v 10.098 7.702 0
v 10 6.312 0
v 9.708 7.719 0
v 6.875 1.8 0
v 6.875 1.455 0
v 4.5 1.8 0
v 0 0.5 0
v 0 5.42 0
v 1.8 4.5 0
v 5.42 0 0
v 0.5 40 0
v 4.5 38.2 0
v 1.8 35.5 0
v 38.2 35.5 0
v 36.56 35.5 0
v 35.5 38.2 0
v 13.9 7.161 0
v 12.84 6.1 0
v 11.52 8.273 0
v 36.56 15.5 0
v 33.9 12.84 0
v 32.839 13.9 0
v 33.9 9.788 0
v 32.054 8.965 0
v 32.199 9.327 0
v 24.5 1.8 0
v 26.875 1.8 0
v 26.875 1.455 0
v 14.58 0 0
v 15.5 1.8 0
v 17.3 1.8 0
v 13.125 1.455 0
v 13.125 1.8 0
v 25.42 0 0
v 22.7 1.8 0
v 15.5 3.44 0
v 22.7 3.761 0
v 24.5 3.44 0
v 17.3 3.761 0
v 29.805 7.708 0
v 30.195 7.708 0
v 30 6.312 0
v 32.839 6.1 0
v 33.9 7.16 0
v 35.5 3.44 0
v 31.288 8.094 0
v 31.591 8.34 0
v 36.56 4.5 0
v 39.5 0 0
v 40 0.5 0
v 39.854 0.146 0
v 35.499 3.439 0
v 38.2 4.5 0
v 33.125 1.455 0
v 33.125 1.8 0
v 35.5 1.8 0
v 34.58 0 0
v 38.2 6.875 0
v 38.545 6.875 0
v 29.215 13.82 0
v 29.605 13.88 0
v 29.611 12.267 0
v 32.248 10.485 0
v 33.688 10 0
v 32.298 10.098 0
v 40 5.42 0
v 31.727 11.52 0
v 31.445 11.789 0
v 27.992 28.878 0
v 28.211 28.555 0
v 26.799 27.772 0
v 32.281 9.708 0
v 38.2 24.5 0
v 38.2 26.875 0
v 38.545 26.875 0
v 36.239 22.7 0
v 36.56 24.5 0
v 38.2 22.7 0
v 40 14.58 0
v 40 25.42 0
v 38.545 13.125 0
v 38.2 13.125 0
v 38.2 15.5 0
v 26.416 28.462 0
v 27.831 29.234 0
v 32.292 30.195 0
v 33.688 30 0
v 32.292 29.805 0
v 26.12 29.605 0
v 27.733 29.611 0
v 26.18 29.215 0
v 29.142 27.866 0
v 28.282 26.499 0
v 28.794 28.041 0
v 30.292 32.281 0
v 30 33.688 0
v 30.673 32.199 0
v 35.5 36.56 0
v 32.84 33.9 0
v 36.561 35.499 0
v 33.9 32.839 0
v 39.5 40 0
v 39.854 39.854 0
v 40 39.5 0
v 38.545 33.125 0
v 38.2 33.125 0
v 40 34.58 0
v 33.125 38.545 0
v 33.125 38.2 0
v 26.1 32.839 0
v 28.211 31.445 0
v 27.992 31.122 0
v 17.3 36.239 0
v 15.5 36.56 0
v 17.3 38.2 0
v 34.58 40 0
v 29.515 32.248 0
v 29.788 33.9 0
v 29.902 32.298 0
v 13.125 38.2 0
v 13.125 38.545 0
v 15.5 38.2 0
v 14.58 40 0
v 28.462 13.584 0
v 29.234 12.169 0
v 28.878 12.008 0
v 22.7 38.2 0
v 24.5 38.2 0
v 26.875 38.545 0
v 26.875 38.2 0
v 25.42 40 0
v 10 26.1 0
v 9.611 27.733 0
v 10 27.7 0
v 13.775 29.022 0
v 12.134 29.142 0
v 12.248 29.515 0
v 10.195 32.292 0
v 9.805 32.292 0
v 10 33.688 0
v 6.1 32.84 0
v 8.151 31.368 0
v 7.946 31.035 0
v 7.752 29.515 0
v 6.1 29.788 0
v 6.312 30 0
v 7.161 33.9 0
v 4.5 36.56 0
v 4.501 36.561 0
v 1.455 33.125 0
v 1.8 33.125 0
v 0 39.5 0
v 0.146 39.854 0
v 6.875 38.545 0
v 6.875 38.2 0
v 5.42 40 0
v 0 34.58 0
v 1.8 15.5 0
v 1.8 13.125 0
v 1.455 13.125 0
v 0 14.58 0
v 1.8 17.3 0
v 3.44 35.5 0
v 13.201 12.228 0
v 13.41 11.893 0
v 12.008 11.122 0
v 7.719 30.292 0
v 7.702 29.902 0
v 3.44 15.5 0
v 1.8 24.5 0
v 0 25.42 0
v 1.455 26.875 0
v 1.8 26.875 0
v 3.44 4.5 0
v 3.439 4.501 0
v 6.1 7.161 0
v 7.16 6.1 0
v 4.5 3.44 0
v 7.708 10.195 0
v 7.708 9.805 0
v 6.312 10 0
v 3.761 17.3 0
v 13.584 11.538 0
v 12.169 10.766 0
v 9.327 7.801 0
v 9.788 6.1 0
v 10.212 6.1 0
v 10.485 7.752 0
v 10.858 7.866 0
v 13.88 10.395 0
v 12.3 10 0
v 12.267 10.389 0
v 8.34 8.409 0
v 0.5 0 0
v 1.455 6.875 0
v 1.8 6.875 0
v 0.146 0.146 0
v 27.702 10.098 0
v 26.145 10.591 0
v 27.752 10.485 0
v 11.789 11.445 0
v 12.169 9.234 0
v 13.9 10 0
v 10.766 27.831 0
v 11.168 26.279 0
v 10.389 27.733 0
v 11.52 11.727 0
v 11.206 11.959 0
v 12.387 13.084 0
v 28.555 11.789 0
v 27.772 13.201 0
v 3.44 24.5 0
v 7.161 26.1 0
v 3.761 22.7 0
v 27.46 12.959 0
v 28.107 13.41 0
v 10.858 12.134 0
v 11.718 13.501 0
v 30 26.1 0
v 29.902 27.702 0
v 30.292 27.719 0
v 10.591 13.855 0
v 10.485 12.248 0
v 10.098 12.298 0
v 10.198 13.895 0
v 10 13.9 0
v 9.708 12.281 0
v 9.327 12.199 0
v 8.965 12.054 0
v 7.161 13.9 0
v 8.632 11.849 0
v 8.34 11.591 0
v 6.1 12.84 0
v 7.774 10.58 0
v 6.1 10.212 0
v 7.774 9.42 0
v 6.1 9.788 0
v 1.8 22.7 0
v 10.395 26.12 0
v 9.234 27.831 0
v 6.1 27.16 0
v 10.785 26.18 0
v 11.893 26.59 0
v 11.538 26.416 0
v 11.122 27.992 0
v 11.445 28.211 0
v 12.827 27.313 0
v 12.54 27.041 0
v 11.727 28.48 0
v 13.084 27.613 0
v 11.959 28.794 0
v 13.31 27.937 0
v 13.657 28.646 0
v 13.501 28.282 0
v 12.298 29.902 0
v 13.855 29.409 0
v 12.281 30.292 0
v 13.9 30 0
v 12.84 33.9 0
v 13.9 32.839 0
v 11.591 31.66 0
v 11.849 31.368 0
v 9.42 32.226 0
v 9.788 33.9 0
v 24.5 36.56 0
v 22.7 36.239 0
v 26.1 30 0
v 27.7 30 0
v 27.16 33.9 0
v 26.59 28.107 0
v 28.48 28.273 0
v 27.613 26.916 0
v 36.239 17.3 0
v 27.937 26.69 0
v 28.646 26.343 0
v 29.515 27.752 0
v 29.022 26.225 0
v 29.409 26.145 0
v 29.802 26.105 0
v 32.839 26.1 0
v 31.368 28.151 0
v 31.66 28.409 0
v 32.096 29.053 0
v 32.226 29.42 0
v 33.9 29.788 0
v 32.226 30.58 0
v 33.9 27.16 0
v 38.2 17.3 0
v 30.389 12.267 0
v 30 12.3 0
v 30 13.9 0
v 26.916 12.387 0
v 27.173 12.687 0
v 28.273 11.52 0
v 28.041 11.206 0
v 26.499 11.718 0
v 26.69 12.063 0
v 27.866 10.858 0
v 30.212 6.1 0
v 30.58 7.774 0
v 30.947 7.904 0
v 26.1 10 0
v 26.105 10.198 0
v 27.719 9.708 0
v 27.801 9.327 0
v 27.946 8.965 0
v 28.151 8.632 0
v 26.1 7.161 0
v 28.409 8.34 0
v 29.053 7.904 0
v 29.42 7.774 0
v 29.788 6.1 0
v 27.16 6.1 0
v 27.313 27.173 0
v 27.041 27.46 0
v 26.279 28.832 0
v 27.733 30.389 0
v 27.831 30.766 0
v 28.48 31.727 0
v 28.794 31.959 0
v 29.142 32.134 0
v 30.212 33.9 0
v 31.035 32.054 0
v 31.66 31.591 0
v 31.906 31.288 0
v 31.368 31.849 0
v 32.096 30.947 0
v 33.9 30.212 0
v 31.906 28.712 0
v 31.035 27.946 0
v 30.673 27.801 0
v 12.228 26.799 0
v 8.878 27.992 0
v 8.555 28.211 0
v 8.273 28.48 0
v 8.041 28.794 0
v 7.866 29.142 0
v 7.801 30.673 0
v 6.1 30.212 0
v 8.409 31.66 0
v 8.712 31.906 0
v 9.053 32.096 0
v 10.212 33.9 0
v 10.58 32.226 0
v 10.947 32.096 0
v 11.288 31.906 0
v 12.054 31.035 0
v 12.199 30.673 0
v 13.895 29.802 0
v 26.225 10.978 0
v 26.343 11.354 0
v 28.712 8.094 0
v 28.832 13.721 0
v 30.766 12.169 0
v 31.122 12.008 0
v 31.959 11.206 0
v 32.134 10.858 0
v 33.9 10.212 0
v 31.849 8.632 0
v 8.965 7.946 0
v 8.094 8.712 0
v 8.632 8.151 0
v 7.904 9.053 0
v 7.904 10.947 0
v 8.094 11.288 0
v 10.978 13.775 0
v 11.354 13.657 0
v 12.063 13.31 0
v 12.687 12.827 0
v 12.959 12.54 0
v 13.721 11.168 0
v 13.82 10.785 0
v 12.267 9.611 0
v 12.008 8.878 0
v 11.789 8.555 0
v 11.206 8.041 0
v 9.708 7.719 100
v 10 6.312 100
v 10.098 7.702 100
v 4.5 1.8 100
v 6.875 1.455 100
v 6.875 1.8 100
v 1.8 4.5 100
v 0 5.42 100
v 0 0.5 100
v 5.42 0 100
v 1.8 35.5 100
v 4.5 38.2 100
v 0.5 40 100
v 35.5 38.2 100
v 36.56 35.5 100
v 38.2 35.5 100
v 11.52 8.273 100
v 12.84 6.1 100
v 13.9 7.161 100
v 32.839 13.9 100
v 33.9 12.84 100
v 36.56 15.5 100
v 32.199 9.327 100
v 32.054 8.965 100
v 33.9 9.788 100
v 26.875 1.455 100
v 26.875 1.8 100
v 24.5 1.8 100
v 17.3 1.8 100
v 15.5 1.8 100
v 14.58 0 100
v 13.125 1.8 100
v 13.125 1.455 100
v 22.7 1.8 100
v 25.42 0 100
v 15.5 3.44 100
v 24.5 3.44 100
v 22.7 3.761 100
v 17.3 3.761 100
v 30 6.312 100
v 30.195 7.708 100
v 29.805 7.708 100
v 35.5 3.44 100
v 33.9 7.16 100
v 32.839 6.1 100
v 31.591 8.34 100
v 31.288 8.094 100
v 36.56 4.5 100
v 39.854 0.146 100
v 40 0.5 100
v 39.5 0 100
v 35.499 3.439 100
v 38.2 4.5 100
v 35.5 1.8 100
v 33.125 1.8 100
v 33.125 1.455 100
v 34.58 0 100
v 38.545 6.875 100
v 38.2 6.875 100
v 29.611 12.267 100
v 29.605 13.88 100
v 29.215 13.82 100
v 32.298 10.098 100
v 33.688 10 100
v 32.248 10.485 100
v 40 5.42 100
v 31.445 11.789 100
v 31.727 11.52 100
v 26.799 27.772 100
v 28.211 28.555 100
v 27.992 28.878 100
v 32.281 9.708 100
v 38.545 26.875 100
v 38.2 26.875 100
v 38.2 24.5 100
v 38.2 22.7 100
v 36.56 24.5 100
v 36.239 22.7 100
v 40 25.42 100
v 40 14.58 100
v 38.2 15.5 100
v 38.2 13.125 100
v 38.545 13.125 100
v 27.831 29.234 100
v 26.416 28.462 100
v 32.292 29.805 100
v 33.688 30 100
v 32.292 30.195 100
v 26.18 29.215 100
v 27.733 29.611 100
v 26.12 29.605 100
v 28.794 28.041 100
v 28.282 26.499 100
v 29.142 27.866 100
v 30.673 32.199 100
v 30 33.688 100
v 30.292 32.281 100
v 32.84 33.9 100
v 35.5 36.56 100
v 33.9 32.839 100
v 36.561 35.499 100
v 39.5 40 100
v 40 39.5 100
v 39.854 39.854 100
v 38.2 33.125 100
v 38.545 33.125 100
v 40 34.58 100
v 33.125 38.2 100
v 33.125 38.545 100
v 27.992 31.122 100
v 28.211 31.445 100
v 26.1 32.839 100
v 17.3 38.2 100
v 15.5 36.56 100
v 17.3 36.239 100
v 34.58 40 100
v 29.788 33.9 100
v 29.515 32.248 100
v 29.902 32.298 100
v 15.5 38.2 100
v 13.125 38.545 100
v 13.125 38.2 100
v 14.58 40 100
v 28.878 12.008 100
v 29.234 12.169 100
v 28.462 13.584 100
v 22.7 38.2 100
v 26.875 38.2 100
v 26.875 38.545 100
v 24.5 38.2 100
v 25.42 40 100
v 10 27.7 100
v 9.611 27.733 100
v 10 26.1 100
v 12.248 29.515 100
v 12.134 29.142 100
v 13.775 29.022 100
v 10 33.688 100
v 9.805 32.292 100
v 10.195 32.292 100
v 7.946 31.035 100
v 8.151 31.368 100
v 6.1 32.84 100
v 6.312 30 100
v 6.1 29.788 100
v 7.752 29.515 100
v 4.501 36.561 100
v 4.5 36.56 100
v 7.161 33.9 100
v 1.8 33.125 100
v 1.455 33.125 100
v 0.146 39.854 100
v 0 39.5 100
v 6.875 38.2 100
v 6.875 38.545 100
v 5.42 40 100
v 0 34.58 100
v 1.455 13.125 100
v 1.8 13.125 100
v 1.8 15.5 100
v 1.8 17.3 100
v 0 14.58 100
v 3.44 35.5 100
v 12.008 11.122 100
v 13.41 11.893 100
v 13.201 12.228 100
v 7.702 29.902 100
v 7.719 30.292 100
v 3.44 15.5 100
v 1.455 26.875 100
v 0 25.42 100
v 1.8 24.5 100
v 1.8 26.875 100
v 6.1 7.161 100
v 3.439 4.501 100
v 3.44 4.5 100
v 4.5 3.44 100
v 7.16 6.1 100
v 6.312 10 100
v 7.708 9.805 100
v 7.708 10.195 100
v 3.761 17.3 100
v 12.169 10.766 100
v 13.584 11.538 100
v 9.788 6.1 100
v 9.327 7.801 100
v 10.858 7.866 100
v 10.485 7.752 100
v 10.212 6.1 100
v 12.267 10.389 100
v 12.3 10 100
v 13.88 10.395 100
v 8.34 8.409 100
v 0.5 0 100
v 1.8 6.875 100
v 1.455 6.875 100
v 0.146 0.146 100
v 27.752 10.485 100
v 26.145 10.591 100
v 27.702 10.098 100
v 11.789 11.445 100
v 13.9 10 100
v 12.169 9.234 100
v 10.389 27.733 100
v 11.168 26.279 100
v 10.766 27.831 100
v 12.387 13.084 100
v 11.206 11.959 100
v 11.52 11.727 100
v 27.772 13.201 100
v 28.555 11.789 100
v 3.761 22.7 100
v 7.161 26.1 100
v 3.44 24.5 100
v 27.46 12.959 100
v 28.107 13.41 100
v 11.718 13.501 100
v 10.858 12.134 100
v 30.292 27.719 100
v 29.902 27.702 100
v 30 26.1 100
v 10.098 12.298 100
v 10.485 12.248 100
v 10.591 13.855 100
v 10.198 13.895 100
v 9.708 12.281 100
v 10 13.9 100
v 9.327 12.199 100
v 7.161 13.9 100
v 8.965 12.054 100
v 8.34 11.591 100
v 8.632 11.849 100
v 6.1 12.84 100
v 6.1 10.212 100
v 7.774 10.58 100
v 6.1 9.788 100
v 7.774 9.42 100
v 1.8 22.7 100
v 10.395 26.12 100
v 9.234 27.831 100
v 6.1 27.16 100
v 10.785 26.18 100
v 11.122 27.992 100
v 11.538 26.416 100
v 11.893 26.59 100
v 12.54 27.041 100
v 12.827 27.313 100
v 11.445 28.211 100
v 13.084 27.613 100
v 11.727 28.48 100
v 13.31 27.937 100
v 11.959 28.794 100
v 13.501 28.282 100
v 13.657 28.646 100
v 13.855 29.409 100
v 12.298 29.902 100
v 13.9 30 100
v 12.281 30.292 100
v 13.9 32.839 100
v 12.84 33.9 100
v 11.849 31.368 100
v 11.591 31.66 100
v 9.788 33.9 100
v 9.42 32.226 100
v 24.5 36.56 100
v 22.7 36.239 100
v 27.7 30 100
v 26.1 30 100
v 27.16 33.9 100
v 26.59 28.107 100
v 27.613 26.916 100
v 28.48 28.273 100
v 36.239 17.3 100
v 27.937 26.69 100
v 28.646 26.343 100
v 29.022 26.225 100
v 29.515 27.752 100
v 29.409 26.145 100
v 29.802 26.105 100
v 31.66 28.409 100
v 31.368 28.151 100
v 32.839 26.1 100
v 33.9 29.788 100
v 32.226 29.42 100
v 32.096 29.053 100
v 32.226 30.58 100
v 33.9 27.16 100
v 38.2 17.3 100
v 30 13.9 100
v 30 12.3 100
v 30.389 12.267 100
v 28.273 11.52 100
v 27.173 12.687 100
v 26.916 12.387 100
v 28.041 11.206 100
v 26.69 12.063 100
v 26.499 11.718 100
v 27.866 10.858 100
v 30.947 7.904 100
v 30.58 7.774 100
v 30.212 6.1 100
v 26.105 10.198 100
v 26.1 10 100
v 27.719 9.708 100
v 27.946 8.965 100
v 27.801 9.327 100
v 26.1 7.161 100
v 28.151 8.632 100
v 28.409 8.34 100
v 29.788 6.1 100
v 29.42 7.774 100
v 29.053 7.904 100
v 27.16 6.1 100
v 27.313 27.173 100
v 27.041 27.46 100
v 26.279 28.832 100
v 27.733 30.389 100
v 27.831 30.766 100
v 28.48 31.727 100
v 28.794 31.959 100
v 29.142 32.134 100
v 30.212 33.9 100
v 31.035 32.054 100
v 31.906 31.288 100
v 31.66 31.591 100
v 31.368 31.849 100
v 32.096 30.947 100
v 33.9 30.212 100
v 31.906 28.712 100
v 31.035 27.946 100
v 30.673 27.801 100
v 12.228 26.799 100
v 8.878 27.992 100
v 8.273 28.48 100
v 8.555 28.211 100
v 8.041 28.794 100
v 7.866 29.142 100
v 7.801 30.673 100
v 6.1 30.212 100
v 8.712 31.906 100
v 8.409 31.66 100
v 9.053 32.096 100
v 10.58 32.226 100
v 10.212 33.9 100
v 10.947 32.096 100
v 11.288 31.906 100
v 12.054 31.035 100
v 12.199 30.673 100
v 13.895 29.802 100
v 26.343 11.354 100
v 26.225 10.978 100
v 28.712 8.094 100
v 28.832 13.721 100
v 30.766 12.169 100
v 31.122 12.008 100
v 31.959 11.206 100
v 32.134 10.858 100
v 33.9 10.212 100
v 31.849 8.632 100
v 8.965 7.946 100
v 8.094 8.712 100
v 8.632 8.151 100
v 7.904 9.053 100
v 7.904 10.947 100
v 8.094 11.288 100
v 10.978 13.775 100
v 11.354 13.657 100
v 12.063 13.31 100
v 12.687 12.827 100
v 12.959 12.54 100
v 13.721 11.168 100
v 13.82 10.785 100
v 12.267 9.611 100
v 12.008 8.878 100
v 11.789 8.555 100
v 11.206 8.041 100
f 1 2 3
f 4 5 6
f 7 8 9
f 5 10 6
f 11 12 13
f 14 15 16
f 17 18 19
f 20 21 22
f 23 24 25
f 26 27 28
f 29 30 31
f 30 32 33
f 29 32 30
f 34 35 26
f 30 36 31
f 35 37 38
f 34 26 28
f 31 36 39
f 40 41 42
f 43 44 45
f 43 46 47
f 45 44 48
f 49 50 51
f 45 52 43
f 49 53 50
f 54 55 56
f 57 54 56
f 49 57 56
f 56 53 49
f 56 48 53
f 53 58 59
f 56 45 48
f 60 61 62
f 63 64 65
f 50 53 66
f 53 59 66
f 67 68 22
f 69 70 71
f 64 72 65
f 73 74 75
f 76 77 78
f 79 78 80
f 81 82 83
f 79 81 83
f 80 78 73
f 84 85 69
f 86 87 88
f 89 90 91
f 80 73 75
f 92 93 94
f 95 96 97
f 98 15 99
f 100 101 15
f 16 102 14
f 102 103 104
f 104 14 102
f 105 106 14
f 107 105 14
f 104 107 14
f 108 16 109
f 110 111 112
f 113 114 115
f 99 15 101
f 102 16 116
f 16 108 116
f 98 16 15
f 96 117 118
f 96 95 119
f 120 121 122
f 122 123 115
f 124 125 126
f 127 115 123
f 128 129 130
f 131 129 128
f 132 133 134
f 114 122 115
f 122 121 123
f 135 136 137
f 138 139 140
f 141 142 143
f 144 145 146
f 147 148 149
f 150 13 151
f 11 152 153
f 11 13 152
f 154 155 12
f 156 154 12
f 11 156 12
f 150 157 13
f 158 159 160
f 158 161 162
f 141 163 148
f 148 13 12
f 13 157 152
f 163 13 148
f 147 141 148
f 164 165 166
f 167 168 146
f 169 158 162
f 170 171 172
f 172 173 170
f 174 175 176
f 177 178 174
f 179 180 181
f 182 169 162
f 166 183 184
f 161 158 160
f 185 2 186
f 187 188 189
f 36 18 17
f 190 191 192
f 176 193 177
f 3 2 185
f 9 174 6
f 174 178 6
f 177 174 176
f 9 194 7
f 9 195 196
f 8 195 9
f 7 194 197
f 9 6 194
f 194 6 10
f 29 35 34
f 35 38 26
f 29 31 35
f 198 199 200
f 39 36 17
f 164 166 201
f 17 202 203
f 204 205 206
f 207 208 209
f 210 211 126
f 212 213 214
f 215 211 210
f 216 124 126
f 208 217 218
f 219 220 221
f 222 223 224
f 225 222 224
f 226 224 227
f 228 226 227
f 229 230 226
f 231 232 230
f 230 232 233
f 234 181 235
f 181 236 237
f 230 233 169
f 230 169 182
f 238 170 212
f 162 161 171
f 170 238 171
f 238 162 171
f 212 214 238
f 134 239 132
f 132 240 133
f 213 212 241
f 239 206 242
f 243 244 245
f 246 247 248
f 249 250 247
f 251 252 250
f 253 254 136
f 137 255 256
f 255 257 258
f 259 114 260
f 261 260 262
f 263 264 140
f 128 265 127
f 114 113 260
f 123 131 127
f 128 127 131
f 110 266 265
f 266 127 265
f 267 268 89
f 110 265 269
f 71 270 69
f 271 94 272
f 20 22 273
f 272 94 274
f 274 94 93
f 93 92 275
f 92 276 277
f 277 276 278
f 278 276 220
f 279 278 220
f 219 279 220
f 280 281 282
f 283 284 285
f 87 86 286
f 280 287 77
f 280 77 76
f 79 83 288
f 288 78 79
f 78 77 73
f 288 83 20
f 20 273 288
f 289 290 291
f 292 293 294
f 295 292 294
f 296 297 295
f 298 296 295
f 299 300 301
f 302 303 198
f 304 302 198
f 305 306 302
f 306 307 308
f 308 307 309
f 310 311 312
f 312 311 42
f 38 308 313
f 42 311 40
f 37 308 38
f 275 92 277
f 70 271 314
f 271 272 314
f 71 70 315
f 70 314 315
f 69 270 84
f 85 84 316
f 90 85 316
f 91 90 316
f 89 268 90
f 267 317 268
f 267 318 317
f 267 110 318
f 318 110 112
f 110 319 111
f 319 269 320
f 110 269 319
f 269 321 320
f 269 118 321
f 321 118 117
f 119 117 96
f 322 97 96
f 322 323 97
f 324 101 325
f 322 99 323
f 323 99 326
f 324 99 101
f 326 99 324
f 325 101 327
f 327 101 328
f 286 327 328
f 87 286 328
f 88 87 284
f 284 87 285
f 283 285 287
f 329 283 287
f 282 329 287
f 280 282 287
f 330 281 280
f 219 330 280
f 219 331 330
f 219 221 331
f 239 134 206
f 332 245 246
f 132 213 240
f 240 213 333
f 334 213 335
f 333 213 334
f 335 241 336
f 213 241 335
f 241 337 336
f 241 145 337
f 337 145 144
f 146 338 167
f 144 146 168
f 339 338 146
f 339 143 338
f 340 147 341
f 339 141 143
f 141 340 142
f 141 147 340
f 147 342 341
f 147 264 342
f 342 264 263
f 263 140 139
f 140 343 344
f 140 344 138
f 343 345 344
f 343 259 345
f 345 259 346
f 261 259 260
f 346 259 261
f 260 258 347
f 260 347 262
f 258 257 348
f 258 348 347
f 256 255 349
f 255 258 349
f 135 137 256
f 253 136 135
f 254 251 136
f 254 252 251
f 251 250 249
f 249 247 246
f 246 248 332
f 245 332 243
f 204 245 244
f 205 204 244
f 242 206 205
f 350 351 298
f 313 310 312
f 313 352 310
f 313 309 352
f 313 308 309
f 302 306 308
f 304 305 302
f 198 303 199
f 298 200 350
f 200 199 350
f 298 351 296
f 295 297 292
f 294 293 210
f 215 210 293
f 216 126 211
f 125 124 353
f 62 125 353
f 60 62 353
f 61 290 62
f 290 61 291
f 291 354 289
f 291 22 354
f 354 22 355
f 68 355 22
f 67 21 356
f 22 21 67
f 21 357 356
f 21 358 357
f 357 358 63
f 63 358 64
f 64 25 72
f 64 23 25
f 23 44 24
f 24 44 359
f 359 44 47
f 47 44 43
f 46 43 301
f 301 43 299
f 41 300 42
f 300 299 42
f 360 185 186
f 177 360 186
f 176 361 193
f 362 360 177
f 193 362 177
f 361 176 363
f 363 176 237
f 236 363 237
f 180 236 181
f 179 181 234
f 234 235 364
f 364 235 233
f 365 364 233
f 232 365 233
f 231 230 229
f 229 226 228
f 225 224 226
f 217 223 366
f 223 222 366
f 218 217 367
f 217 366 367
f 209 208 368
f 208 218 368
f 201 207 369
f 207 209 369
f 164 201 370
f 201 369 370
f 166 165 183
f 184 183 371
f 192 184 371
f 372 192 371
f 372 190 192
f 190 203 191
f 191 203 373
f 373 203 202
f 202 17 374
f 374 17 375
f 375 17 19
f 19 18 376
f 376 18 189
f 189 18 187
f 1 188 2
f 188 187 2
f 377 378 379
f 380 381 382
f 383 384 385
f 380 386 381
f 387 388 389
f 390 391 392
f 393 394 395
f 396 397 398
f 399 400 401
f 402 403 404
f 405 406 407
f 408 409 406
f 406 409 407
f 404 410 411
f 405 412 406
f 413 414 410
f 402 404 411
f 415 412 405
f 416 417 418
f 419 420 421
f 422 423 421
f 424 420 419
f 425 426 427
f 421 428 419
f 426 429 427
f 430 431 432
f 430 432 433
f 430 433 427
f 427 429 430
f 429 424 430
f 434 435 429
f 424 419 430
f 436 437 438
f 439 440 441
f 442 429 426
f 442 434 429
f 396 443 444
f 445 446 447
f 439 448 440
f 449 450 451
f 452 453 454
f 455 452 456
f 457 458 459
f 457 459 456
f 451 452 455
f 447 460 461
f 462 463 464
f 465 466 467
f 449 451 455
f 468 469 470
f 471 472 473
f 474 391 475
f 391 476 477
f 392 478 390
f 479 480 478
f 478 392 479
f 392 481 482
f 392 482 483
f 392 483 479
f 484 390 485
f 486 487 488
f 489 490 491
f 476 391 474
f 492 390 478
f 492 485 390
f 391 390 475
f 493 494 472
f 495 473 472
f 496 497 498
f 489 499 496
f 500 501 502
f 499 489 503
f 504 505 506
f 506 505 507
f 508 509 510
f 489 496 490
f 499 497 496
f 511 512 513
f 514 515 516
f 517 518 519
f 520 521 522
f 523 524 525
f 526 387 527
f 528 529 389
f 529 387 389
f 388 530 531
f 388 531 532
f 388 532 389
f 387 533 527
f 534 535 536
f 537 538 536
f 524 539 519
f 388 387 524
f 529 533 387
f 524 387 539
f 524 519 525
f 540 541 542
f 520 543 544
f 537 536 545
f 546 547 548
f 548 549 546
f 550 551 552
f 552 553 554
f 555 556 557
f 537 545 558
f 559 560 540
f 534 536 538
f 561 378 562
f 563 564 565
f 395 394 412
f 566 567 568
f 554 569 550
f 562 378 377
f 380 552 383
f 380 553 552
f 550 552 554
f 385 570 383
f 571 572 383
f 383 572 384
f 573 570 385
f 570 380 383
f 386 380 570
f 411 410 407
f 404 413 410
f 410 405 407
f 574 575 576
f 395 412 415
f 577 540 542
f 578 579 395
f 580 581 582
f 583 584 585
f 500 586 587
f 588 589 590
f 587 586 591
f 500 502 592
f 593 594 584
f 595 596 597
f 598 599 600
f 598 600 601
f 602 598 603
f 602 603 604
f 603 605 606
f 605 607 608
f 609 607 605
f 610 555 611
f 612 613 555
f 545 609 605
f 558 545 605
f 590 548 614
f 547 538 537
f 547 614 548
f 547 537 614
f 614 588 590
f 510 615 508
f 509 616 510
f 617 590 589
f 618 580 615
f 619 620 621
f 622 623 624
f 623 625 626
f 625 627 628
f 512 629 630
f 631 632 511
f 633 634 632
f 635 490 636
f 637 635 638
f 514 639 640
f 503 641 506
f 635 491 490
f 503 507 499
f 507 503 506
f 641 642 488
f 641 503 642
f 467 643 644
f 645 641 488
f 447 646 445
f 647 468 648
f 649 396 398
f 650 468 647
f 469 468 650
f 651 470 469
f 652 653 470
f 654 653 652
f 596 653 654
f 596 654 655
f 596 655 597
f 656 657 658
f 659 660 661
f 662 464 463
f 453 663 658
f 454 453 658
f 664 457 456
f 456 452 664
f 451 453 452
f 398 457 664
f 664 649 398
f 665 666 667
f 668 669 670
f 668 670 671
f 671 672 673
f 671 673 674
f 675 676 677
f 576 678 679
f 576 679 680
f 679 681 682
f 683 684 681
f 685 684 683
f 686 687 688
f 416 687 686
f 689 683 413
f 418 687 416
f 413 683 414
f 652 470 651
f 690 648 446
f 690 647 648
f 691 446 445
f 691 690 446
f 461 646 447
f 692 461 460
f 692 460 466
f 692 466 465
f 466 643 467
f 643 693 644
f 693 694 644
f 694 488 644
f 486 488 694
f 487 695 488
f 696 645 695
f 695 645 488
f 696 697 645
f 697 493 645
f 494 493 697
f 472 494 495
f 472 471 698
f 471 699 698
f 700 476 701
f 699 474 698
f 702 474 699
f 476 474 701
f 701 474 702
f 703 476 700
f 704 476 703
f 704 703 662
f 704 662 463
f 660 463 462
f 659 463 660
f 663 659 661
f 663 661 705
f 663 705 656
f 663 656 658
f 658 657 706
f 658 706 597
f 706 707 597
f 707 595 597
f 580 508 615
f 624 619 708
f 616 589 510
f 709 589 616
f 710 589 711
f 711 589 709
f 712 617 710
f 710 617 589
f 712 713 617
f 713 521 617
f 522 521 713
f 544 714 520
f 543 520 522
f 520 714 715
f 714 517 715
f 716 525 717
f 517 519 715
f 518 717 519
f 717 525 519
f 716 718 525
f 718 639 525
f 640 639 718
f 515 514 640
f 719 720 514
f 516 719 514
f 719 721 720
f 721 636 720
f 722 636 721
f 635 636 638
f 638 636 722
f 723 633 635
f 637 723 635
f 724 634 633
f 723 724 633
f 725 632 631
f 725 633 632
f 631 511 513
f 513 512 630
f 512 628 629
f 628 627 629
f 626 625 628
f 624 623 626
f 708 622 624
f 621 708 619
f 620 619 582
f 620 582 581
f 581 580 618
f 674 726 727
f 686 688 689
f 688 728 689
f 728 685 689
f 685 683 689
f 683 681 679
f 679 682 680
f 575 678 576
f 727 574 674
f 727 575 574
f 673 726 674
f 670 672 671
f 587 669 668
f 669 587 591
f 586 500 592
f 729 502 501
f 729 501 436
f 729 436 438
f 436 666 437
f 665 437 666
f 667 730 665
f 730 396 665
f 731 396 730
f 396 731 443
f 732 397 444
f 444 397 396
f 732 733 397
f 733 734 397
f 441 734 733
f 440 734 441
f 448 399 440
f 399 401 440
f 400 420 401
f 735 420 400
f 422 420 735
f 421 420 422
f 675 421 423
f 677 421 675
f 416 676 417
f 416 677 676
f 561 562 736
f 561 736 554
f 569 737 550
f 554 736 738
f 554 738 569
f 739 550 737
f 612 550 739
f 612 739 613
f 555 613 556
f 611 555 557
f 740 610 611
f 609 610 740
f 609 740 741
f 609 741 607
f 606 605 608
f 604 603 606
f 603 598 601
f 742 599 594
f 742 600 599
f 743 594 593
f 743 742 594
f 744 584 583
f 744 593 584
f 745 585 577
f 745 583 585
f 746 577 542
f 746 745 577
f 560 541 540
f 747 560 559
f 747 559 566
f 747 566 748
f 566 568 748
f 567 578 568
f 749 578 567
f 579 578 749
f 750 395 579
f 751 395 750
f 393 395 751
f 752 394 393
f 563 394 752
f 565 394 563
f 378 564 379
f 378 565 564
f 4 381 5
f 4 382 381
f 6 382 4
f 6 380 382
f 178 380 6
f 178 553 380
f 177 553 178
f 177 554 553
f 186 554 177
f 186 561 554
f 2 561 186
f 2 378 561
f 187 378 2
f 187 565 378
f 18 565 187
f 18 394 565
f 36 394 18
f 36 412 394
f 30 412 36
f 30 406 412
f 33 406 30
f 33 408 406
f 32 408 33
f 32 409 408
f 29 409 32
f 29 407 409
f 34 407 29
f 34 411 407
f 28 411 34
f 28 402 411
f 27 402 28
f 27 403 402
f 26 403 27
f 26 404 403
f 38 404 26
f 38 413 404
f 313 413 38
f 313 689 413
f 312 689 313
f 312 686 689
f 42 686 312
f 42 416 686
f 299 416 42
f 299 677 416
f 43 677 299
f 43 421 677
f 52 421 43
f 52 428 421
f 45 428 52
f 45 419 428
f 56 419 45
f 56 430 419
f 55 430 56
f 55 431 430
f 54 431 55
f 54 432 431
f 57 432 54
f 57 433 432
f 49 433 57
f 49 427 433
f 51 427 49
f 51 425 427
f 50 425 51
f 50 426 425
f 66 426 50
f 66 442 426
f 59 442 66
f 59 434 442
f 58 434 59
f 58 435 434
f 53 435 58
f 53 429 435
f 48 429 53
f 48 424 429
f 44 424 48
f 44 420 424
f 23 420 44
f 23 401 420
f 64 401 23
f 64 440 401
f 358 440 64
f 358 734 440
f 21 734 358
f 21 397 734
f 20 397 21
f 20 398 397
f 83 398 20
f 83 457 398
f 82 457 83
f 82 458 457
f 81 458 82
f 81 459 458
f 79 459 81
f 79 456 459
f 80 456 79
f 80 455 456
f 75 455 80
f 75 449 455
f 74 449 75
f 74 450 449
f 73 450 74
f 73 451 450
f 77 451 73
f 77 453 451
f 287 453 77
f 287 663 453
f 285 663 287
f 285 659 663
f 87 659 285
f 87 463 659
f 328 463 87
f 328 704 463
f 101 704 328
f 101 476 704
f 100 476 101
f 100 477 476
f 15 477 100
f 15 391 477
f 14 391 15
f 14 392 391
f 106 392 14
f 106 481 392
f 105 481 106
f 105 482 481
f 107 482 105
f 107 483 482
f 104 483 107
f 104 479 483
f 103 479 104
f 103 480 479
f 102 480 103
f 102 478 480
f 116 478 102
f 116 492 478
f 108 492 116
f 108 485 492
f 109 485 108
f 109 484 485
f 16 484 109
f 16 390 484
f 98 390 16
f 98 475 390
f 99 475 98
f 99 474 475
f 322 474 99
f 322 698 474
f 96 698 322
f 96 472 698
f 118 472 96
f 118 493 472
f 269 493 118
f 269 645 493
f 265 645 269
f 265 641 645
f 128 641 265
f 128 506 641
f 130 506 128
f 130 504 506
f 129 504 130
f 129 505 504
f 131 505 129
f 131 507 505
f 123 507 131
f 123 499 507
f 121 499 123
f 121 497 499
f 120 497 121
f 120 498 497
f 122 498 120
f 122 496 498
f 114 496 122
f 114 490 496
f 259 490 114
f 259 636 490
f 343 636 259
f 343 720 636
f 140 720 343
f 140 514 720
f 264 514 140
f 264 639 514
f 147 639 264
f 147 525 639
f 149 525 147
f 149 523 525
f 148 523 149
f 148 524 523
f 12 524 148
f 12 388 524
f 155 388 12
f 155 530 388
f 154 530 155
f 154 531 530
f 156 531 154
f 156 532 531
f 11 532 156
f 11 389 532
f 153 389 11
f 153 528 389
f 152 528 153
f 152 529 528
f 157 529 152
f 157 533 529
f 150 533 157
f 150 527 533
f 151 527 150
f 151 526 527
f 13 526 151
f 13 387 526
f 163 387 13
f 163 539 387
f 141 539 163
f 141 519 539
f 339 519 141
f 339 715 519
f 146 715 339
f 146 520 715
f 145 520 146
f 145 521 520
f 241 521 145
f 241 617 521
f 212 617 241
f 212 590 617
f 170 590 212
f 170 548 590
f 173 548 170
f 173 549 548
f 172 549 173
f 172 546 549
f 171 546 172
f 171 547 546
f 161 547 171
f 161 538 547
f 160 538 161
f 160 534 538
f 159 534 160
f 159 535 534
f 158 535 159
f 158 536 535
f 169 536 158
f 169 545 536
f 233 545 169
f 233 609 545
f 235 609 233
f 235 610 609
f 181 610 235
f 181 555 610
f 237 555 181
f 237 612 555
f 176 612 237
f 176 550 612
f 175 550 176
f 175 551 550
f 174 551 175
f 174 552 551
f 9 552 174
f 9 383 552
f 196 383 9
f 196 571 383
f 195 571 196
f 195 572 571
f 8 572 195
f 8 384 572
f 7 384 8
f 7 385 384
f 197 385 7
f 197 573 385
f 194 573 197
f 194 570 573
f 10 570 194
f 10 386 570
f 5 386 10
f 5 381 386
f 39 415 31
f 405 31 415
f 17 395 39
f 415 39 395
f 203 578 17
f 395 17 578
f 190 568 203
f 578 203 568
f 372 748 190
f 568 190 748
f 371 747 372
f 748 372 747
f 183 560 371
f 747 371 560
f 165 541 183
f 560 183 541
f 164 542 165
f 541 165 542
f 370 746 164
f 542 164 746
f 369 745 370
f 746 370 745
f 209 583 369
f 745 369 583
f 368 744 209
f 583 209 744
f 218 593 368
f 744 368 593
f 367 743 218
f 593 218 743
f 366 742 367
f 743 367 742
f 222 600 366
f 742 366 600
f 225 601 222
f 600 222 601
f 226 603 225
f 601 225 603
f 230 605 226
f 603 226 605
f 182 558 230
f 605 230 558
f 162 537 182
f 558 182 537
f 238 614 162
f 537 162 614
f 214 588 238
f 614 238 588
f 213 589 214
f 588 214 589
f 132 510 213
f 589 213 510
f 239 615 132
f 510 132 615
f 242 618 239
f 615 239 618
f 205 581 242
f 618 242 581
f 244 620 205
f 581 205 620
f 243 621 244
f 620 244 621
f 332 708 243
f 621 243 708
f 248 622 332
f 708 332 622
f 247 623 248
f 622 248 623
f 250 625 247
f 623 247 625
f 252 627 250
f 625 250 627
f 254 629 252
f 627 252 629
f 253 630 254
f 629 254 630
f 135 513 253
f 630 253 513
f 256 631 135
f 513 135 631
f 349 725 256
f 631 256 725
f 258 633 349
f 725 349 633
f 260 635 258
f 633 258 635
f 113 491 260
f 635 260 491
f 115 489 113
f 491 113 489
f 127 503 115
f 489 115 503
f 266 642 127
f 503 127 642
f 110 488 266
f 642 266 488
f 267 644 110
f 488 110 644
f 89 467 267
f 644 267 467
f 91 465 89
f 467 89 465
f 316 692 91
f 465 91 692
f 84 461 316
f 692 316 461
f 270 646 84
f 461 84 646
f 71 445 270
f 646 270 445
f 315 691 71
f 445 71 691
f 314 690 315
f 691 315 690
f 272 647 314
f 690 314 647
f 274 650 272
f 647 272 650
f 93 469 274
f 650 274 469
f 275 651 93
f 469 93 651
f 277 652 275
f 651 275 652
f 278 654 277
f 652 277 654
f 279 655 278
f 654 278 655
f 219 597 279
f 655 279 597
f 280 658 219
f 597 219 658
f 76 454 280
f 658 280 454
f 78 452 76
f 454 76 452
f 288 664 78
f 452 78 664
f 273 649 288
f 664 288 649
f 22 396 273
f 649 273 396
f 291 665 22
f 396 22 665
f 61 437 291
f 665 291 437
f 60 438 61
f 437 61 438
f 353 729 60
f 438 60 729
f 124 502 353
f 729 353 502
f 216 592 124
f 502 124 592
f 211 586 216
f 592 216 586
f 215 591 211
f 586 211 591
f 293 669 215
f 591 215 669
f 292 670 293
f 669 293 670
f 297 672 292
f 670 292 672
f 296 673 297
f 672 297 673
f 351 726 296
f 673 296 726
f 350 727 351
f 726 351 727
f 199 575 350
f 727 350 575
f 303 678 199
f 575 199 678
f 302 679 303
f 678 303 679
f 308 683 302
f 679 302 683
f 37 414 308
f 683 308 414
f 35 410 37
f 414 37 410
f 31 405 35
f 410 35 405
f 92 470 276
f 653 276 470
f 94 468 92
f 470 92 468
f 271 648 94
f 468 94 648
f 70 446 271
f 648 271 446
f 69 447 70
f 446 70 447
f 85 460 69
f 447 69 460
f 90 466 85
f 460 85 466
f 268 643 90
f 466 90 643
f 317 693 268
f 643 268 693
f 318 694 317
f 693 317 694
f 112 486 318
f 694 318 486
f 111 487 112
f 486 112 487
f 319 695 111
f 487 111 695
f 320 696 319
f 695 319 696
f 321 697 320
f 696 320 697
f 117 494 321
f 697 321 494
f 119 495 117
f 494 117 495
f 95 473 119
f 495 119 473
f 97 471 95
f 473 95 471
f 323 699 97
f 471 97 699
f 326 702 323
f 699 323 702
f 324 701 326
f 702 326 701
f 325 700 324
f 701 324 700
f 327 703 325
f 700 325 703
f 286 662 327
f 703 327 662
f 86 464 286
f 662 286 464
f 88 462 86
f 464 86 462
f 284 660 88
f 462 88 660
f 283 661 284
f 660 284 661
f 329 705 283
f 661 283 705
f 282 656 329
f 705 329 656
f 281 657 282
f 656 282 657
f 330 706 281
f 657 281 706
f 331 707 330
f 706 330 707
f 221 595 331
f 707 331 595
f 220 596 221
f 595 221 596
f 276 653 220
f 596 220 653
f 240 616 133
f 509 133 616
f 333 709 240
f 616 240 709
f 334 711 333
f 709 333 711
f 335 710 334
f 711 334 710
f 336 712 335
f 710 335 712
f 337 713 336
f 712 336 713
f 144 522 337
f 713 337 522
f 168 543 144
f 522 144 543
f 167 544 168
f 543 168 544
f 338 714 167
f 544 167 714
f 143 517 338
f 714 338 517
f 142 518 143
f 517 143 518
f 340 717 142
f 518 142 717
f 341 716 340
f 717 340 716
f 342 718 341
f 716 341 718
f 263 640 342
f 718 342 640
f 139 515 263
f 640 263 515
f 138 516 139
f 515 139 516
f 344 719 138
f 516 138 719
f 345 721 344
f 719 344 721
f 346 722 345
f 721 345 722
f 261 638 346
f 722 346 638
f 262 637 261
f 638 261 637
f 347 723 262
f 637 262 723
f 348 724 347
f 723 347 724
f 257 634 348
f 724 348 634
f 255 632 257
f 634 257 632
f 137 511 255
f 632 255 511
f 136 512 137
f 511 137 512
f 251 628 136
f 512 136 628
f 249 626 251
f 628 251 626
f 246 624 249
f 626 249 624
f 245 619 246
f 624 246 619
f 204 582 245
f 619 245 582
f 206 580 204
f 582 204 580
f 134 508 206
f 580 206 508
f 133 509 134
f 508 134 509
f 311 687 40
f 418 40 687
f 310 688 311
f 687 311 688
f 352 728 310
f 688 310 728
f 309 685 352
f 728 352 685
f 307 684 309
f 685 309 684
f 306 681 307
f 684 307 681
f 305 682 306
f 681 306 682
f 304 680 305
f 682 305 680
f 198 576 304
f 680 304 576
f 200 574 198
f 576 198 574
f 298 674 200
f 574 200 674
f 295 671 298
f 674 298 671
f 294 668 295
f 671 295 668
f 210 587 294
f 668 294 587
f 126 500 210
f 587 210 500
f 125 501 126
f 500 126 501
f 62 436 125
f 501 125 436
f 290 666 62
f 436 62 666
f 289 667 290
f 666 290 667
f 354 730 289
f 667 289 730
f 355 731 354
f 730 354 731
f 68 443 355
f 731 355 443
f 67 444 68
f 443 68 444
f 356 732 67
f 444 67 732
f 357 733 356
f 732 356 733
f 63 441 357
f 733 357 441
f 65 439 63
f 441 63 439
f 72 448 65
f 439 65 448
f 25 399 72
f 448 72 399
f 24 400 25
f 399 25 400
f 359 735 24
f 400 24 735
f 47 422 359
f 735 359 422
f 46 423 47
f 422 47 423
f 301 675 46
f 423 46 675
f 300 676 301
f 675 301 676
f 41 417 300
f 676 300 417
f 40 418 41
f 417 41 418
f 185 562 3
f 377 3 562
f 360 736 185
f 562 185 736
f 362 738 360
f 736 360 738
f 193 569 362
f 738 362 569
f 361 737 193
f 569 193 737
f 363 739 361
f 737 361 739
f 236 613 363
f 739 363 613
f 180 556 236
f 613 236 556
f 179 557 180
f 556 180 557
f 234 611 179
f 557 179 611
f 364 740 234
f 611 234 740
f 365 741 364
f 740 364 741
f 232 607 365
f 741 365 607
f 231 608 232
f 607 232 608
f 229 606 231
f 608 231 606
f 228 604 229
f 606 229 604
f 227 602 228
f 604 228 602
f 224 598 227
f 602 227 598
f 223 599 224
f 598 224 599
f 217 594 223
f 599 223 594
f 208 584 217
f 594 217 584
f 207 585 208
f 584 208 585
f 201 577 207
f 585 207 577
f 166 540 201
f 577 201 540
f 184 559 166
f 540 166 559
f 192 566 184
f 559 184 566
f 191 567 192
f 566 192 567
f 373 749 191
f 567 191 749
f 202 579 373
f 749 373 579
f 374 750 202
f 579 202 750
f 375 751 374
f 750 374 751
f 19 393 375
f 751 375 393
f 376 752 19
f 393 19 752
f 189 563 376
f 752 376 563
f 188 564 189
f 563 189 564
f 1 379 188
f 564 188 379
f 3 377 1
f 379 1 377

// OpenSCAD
$fa = 1.0;
$fs = 0.4;

module center(l=1,r=1,t=1,b=1){
    difference(){
        translate([-3.9,-3.9,0]) square(7.8);
        circle(r=2.3);
        if(t==1) {translate([0,3.688,0]) rotate([0,0,45]) square(0.3);}
        if(b==1) {translate([0,-4.112,0]) rotate([0,0,45]) square(0.3);}
        if(r==1) {translate([3.9,-0.212,0]) rotate([0,0,45]) square(0.3);}
        if(l==1) {translate([-3.9,-0.212,0]) rotate([0,0,45]) square(0.3);}
   }
}
 
module rcenter(){
    difference(){
        hull(){
            translate([-3.9,-3.9,0]) square([3.9,7.8]);
            translate([-3.9,-3.9,0]) square([7.8,3.9]);
            circle(r=3.9);
        }
    circle(r=2.3);
    translate([0,-4.112,0]) rotate([0,0,45]) square(0.3);
    translate([-3.9,-0.212,0]) rotate([0,0,45]) square(0.3);
   }
}

module corner(){
    translate([0.5,0.5,0]) circle(r=0.5);
    hull(){
        translate([0.5,0,0]) square([4.92,1.8]);
        translate([0.5,1.455,0]) square([6.375,0.345]);
    }
    hull(){
        translate([0,0.5,0]) square([1.8,4.92]);
        translate([1.455,0.5,0]) square([0.345,6.375]);
    }
    translate([1.8,1.8,0]) square(2.7);
    translate([4.5,3.44,0]) rotate([0,0,45]) square([3.763,1.5]);
}

module mids(){
    hull(){
        translate([-5.42,0,0]) square([10.84,1.8]);
        translate([-6.875,1.455,0]) square([13.75,0.345]);
    }
    translate([2.7,1.8,0]) square([1.8,1.961]);
    translate([-4.5,1.8,0]) square([1.8,1.961]);
    translate([2.7,3.761,0]) rotate([0,0,-45]) square([1.5,4.808]);
    translate([-2.7,3.761,0]) rotate([0,0,45]) translate([-1.5,0,0]) square([1.5,4.808]);
}
 
module vslot4040(){
   corner();
   translate([40,0,0]) rotate([0,0,90]) corner();
   translate([40,40,0]) rotate([0,0,180]) corner();
   translate([0,40,0]) rotate([0,0,270]) corner();
   translate([10,10,0]) rcenter();
   translate([30,30,0])  rotate([0,0,180]) rcenter();
   translate([30,10,0]) rotate([0,0,90]) rcenter();
   translate([10,30,0]) rotate([0,0,270]) rcenter();
   module mids2(){
       difference(){
           mids();
           translate([0,-0.+212,0]) rotate([0,0,45]) translate([-0.15,0,0]) square(0.3);
       }
   }
   translate([20,0,0]) mids2();
   translate([0,20]) rotate([0,0,-90]) mids2();
   translate([20,40,0]) rotate([0,0,180]) mids2();
   translate([40,20]) rotate([0,0,90]) mids2();
}
 
 // linear extrude height is desired length of v-slot
 color("slategray"){
     linear_extrude(height=100) vslot4040();
 }
